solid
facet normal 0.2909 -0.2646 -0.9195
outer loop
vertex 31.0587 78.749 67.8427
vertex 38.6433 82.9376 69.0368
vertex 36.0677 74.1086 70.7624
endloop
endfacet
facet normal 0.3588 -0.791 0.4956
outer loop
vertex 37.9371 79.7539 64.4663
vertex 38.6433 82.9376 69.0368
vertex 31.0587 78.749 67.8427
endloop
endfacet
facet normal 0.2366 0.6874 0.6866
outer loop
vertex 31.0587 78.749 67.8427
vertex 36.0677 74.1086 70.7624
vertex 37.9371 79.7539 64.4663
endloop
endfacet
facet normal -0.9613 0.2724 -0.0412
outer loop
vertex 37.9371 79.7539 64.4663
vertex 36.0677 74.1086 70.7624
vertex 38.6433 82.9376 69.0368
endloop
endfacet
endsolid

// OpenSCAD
// Auto-generated auxetic polyhedron
points = [
    [36.067680, 74.108563, 70.762423],
    [38.643295, 82.937555, 69.036769],
    [31.058725, 78.749044, 67.842683],
    [37.937064, 79.753917, 64.466297],
];

faces = [
    [0, 1, 2],
    [2, 1, 3],
    [3, 0, 2],
    [1, 0, 3],
];

polyhedron(points = points, faces = faces);
